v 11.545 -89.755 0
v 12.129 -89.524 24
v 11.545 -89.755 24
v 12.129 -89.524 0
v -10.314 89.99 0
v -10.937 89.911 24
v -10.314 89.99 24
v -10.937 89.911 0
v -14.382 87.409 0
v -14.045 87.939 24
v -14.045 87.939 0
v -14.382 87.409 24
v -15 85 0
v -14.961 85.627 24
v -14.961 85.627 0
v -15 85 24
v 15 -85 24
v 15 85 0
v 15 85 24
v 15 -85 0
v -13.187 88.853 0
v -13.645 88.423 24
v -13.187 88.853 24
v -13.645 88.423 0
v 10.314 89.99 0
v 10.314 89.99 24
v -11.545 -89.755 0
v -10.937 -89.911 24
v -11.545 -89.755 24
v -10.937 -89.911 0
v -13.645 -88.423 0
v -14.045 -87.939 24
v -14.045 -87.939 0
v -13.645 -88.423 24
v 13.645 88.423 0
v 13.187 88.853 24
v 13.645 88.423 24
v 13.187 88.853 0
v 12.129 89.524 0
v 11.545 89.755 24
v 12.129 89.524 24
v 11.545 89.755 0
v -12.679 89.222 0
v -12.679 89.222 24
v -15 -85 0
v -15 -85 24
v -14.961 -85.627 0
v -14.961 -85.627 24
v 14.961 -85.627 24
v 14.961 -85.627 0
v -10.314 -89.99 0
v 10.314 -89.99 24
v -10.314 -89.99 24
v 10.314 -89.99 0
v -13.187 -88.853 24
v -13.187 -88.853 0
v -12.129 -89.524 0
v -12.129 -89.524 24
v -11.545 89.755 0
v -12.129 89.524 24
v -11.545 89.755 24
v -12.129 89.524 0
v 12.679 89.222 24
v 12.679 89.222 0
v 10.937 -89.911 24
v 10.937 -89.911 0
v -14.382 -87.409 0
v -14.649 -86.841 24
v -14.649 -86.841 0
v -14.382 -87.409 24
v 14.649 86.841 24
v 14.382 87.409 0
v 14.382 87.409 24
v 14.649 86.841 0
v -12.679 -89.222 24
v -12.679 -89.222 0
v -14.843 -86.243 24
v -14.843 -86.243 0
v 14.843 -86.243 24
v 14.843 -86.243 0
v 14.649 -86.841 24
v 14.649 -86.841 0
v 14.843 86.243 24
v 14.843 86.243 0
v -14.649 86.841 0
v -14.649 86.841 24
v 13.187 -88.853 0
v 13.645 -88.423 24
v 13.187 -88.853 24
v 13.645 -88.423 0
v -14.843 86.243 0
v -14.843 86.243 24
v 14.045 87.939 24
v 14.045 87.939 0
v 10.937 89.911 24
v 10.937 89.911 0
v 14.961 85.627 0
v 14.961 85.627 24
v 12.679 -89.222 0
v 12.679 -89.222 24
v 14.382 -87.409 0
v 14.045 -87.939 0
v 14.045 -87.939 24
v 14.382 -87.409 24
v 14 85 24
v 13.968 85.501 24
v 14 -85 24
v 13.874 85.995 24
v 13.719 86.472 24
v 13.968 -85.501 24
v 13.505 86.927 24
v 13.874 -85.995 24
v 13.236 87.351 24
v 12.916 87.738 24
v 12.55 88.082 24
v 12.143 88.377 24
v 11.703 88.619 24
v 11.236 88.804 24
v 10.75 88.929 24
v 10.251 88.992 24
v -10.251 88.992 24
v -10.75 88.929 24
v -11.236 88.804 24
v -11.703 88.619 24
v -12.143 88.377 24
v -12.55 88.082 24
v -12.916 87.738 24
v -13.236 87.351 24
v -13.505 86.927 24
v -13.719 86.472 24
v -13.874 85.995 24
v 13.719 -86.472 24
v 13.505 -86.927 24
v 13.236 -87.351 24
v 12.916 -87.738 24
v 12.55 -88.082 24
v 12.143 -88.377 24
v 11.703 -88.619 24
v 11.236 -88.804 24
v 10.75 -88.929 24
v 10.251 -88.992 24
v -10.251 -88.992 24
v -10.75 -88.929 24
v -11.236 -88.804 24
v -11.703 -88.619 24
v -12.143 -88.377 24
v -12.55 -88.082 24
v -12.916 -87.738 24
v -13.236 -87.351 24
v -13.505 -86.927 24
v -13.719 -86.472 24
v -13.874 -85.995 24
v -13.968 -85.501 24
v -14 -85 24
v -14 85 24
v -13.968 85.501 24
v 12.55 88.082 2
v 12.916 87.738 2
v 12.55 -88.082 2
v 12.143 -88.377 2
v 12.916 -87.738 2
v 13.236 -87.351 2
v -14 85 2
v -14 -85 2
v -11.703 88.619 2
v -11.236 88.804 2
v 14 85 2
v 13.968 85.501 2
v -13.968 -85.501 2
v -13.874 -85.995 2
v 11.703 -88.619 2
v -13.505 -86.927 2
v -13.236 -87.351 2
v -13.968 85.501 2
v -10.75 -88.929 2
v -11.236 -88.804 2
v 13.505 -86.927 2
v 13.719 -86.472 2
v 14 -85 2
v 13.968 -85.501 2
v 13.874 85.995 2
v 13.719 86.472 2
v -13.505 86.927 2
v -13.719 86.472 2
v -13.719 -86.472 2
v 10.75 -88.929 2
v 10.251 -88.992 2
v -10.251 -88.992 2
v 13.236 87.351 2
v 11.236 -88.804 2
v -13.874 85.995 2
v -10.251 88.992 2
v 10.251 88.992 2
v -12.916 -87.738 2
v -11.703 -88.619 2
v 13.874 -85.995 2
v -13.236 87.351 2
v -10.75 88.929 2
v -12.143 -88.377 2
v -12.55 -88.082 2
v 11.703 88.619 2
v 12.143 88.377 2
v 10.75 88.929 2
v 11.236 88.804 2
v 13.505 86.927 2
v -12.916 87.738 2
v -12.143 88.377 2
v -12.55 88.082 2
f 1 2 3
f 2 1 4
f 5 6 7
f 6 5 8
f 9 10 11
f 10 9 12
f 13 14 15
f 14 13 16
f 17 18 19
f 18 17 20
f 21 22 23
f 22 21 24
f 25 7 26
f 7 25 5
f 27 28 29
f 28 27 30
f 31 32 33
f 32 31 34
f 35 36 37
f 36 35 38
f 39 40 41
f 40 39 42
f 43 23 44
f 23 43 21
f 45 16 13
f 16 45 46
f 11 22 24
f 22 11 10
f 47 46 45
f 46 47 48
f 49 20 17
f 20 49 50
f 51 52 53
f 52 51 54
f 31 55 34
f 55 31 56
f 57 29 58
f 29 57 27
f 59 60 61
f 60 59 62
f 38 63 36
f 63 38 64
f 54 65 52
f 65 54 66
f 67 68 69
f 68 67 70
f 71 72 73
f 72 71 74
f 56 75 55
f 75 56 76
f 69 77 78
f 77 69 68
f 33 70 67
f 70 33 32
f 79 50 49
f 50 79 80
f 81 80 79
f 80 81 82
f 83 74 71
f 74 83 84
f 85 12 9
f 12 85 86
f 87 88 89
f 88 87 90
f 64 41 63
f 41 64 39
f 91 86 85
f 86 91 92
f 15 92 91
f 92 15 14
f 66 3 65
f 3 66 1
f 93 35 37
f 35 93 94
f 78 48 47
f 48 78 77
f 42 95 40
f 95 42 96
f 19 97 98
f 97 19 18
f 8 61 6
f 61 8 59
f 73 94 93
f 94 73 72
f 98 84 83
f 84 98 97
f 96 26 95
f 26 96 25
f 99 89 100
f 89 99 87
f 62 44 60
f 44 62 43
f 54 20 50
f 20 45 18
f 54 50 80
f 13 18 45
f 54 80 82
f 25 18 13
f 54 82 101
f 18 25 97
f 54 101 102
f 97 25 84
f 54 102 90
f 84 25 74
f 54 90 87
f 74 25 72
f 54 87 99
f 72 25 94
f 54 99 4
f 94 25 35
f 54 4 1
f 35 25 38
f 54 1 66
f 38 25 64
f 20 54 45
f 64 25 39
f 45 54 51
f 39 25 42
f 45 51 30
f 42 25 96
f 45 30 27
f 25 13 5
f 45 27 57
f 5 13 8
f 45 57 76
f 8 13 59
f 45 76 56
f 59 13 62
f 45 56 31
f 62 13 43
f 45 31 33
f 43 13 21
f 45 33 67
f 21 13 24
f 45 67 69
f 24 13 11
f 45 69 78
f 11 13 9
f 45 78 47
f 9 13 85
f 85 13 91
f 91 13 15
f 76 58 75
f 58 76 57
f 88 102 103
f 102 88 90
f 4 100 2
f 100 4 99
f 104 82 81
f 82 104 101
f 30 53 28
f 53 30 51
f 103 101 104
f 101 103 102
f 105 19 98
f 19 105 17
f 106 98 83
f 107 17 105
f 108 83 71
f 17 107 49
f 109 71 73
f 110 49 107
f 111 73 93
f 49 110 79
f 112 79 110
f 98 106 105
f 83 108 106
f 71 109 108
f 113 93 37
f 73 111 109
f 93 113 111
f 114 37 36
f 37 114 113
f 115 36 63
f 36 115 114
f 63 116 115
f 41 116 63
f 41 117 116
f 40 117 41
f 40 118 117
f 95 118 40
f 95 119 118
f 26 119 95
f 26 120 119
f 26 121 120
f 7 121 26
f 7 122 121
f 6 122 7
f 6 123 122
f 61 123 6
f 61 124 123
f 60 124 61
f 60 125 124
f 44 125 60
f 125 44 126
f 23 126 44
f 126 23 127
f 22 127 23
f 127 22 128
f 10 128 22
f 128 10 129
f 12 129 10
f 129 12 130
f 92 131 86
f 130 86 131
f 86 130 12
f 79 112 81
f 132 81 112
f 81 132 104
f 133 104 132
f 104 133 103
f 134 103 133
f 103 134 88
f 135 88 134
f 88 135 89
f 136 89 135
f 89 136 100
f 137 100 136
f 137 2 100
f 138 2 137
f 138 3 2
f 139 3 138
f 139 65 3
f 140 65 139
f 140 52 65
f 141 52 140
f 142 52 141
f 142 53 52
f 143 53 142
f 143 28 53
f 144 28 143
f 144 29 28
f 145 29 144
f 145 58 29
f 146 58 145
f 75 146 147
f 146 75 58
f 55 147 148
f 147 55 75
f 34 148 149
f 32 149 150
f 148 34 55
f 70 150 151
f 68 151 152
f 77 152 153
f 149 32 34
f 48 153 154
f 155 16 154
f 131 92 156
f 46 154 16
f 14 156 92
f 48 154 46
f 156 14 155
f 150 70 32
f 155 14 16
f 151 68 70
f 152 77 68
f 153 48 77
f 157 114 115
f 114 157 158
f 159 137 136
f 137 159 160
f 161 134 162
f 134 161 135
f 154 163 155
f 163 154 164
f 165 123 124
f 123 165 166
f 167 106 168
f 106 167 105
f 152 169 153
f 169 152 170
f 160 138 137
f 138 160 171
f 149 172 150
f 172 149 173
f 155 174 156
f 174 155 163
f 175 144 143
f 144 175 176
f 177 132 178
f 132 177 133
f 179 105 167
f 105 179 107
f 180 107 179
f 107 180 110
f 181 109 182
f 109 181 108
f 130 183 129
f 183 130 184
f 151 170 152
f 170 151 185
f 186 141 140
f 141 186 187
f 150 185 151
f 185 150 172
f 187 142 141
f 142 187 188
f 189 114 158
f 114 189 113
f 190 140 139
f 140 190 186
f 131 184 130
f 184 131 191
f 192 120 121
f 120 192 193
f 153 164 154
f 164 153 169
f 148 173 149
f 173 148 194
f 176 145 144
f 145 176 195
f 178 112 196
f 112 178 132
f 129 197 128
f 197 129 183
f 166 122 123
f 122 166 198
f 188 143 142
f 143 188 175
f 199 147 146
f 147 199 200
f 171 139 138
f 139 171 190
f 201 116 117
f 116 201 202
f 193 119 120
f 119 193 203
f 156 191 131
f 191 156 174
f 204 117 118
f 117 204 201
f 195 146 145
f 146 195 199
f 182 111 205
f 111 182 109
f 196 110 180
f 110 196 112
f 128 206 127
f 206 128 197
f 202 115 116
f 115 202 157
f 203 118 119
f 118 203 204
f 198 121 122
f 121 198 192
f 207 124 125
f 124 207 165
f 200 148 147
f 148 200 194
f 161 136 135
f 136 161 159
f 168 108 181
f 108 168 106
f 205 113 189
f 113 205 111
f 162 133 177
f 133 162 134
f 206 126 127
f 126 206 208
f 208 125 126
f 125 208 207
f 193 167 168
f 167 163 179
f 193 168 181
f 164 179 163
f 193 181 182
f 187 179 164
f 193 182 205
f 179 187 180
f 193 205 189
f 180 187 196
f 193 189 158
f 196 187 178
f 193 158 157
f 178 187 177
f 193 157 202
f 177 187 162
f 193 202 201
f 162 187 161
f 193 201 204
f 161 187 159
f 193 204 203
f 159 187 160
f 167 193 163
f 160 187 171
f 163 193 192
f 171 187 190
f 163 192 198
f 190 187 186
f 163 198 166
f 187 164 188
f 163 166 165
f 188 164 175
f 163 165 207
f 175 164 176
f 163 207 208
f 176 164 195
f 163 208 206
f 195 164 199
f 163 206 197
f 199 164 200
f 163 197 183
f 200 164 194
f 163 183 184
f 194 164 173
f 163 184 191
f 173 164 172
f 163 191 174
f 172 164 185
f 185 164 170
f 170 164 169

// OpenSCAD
$fn = 50;


difference() {
	union() {
		hull() {
			translate(v = [-10.0000000000, 85.0000000000, 0]) {
				cylinder(h = 24, r = 5);
			}
			translate(v = [10.0000000000, 85.0000000000, 0]) {
				cylinder(h = 24, r = 5);
			}
			translate(v = [-10.0000000000, -85.0000000000, 0]) {
				cylinder(h = 24, r = 5);
			}
			translate(v = [10.0000000000, -85.0000000000, 0]) {
				cylinder(h = 24, r = 5);
			}
		}
	}
	union() {
		translate(v = [0, 0, 2]) {
			hull() {
				translate(v = [-10.0000000000, 85.0000000000, 0]) {
					cylinder(h = 22, r = 4);
				}
				translate(v = [10.0000000000, 85.0000000000, 0]) {
					cylinder(h = 22, r = 4);
				}
				translate(v = [-10.0000000000, -85.0000000000, 0]) {
					cylinder(h = 22, r = 4);
				}
				translate(v = [10.0000000000, -85.0000000000, 0]) {
					cylinder(h = 22, r = 4);
				}
			}
		}
	}
}
